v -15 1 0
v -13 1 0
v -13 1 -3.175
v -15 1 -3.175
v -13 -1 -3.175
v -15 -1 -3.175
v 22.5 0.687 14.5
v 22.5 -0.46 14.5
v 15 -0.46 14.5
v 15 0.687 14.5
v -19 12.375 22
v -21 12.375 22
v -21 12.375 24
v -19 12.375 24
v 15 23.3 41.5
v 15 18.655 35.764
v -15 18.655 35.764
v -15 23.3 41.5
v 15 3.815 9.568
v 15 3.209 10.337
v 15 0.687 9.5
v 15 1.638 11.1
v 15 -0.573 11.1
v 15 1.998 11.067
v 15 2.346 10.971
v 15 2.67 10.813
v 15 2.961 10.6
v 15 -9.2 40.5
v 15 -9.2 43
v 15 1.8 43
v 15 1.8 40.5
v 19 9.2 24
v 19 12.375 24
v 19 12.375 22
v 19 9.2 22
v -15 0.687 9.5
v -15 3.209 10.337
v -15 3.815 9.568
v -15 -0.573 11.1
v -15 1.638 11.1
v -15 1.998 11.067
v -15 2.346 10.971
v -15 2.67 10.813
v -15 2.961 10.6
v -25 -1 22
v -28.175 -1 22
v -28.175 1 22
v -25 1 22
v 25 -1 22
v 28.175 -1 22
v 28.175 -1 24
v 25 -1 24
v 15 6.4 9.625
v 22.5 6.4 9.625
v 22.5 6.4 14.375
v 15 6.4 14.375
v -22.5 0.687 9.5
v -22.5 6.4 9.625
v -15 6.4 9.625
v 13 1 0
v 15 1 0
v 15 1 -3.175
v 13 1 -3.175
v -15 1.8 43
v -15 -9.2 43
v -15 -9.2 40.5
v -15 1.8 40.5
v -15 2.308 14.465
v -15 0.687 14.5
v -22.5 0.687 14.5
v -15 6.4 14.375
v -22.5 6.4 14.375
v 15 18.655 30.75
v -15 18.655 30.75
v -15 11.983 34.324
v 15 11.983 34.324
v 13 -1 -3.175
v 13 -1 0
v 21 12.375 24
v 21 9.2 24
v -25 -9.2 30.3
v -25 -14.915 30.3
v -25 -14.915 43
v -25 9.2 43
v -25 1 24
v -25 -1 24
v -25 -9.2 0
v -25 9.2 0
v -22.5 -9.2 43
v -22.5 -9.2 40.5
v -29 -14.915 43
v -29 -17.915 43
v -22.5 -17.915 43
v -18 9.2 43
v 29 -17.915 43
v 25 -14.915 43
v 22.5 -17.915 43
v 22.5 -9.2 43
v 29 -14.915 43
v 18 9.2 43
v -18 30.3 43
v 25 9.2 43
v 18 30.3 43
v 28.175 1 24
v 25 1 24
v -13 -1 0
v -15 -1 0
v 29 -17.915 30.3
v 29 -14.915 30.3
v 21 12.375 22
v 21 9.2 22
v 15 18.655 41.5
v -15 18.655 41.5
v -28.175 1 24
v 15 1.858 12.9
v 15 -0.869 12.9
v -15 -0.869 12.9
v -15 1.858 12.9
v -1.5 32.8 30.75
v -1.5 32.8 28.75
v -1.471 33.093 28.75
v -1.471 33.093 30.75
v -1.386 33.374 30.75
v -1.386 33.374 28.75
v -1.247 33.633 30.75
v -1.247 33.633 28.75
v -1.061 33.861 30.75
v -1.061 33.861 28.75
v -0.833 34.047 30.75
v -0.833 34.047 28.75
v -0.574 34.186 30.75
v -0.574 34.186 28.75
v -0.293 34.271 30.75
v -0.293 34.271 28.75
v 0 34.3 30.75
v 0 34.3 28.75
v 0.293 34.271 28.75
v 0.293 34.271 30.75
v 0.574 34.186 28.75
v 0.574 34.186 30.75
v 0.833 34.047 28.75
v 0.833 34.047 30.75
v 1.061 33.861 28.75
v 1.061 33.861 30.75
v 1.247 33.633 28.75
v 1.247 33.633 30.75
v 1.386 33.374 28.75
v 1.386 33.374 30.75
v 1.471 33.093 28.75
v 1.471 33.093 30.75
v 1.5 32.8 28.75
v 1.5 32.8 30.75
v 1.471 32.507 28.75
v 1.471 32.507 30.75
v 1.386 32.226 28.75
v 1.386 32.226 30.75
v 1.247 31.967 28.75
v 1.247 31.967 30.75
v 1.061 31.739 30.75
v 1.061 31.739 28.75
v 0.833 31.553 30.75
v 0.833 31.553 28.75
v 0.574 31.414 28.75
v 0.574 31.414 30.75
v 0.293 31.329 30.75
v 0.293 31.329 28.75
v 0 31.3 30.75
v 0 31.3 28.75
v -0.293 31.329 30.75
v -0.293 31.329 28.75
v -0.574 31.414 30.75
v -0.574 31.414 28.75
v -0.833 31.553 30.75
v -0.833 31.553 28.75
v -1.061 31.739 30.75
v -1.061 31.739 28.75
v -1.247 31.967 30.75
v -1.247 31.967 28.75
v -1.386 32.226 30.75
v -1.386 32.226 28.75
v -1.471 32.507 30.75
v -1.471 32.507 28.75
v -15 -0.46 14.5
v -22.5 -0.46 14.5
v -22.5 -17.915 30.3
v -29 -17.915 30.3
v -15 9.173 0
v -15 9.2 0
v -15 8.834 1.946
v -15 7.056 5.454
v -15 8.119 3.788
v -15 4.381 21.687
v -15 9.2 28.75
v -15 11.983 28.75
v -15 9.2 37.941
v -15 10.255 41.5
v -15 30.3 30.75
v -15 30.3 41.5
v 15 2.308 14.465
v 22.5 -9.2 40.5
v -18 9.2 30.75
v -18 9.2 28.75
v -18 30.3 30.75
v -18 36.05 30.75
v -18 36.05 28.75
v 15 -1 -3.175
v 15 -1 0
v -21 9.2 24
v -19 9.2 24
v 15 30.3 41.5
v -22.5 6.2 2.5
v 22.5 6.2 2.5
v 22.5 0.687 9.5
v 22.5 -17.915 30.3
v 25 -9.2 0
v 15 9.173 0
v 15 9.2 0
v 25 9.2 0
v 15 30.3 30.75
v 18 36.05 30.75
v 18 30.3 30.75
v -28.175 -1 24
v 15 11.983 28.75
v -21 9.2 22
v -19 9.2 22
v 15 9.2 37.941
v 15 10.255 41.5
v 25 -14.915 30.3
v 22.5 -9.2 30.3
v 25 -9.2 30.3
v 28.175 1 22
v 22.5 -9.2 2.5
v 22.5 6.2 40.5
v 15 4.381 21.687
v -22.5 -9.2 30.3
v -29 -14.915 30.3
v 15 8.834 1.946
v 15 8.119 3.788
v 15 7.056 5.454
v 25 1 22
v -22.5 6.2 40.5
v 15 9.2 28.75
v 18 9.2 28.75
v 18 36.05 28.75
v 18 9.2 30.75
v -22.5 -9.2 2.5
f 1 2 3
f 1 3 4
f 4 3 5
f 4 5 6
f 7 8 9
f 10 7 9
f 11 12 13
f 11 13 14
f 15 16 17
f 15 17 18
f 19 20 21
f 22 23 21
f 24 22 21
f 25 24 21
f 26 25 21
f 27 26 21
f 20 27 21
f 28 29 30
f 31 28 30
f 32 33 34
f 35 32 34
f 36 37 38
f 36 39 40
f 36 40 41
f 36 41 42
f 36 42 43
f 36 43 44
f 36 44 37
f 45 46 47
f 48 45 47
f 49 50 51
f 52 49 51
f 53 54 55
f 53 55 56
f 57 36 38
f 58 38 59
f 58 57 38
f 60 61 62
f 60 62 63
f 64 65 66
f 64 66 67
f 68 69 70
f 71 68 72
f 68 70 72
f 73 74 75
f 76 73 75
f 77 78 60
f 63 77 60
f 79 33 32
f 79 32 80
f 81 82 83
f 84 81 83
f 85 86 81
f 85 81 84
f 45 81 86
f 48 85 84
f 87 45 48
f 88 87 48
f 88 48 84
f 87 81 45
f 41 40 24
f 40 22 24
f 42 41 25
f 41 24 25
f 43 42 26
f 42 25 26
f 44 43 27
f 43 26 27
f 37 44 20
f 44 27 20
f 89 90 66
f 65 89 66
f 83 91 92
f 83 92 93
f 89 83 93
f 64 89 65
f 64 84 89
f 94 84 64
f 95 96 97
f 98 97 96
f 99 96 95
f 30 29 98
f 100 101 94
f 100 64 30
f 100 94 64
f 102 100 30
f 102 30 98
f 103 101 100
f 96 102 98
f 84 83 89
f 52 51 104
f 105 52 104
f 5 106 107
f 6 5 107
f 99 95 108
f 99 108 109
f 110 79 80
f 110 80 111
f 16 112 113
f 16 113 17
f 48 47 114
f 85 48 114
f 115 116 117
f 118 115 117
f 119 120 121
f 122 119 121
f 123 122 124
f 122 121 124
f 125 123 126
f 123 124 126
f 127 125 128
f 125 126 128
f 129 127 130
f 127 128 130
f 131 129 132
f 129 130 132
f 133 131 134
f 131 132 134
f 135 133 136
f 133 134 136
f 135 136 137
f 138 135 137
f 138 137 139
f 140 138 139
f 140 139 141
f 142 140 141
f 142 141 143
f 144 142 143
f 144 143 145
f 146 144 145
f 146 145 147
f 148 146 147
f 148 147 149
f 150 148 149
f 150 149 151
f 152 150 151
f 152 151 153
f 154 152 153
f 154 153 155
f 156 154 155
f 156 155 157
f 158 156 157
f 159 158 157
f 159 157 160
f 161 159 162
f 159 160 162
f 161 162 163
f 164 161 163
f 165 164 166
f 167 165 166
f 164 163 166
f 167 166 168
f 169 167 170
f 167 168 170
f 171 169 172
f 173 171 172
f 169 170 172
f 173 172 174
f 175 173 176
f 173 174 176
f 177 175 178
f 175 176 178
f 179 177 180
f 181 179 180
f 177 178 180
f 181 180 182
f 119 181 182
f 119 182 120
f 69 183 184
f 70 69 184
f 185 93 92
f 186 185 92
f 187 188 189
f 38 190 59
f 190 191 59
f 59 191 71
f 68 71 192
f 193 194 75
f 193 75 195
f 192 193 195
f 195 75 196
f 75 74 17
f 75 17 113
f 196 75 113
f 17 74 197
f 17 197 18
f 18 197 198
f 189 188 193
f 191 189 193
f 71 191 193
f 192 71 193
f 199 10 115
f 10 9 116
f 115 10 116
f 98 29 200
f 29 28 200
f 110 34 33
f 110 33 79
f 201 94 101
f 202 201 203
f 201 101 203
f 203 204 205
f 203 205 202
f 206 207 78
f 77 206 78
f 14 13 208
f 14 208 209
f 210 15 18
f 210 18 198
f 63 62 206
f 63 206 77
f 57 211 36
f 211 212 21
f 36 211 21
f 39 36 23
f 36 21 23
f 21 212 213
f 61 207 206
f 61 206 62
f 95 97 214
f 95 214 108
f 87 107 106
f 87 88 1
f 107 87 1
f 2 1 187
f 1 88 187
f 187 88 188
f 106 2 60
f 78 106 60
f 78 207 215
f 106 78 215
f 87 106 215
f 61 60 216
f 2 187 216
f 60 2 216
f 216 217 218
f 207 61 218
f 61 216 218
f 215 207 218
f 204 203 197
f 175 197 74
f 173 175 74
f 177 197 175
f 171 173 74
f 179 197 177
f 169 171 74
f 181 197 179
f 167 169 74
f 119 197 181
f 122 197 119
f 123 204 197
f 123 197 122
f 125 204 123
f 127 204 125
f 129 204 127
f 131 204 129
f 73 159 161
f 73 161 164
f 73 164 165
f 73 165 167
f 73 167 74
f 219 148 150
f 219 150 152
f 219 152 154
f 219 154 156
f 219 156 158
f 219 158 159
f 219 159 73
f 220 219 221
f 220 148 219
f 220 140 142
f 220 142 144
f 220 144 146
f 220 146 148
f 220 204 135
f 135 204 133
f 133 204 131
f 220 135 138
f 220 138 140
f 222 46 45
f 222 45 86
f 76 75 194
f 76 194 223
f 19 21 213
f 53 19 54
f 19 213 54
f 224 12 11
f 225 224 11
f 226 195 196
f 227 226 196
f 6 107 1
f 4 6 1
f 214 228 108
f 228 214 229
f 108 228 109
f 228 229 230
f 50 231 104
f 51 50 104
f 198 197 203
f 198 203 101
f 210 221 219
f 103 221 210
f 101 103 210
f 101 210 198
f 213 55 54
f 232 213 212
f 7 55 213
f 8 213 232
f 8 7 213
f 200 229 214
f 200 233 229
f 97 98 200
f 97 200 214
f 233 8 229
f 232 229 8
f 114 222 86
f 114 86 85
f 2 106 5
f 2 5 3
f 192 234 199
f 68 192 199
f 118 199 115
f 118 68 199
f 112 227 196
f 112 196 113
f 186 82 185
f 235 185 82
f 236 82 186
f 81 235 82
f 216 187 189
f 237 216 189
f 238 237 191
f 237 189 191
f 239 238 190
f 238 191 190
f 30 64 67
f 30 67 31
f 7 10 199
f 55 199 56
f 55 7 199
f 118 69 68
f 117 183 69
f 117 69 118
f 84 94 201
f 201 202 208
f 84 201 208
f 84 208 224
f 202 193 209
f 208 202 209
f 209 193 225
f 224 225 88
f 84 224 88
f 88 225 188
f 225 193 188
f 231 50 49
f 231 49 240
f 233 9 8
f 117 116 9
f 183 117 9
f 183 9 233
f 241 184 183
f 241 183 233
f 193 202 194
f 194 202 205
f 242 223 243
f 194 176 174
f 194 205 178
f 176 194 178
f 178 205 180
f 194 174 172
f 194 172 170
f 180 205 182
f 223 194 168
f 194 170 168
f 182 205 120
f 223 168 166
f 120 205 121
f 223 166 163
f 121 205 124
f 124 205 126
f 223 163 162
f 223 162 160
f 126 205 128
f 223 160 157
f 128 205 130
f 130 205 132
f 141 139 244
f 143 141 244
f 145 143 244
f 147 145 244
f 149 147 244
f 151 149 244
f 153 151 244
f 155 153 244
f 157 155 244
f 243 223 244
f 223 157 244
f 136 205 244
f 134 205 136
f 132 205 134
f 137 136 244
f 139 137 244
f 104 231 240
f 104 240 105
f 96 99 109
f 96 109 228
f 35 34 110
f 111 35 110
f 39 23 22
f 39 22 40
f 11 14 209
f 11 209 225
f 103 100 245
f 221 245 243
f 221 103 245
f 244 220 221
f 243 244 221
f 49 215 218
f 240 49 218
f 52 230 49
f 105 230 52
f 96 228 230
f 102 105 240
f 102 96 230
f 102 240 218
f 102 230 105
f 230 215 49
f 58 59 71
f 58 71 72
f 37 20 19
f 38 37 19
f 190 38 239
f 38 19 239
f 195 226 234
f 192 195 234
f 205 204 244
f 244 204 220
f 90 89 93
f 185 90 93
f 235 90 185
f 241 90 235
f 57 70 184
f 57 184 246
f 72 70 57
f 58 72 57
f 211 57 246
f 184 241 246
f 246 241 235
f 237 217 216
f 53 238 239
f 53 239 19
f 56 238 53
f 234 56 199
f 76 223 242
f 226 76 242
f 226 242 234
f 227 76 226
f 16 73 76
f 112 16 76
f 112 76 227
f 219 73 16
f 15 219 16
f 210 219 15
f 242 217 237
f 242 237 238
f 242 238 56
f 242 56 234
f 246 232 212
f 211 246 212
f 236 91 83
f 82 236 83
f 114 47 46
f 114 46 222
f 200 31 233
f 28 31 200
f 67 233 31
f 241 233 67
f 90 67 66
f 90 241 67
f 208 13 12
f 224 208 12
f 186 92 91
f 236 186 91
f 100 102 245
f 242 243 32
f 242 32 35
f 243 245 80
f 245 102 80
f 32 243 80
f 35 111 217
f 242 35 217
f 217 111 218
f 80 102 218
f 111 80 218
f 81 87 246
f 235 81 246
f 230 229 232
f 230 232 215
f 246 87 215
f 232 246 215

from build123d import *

# Parameters (mm, degrees)
SKETCH1_W               = 50
SKETCH1_H               = 18.4
BOSS_EXTRUDE1_DEPTH     = 43
SKETCH2_W               = 7.5
SKETCH2_H               = 5
SKETCH2_W_2             = 30
SKETCH2_H_2             = 1.8
CUT_EXTRUDE1_DEPTH      = 15.6
CUT_EXTRUDE2_START      = -22.5
CUT_EXTRUDE2_DEPTH      = 22.5
CUT_EXTRUDE3_START      = -15
CUT_EXTRUDE3_DEPTH      = 15
BOSS_EXTRUDE3_DEPTH     = 7.5
BOSS_EXTRUDE4_START     = 45
BOSS_EXTRUDE4_DEPTH     = 7.5
BOSS_EXTRUDE7_DEPTH     = 30
MTRL_RMV_DEPTH          = 60.694974663
SKETCH22_W              = 36
SKETCH22_H              = 24.066709319
SKETCH22_W_2            = 3
SKETCH22_H_2            = 2.783290681
BOSS_EXTRUDE8_DEPTH     = 2
BOSS_EXTRUDE9_DEPTH     = 36
SKETCH27_W              = 3
SKETCH27_H              = 21.1
BOSS_EXTRUDE10_DEPTH    = 14.25
SKETCH28_R              = 1.5
CUT_EXTRUDE4_DEPTH      = 53.451549072
SKETCH4_W               = 30
SKETCH4_H               = 11
WIRE_HOLE_DEPTH         = 2.5
SKETCH13_W              = 2
SKETCH13_H              = 2
FRONT_SHIELD_PEGS_DEPTH = 3.175
SKETCH14_W              = 2
SKETCH14_H              = 2
TOP_SHIELD_PEGS_DEPTH   = 3.175
FILLET9_R               = 10
FILLET10_R              = 2
LEGS_START              = 24
LEGS_DEPTH              = 12.7
SKETCH29_W              = 2
SKETCH29_H              = 2
SIDE_SHIELD_PEGS1_DEPTH = 3.175
SIDE_START              = -50
SKETCH29_2_W            = 2
SKETCH29_2_H            = 2
SIDE_SHIELD_PEGS2_DEPTH = 3.175


with BuildPart() as part:
    # Sketch1 → Boss-Extrude1 (new body)
    with BuildSketch(Plane.XY):
        Rectangle(SKETCH1_W, SKETCH1_H)
    extrude(amount=BOSS_EXTRUDE1_DEPTH)

    # Sketch2 → Cut-Extrude1 (cut)
    with BuildSketch(Plane(origin=(0, -9.2, 0), x_dir=(-1, 0, 0), z_dir=(0, -1, 0))):
        with Locations((-18.75, -12)):
            Rectangle(SKETCH2_W, SKETCH2_H)
        with Locations((18.75, -12)):
            Rectangle(SKETCH2_W, SKETCH2_H)
        with Locations((0, -12)):
            Rectangle(SKETCH2_W_2, SKETCH2_H_2)
    extrude(amount=-CUT_EXTRUDE1_DEPTH, mode=Mode.SUBTRACT)

    # Sketch3 → Cut-Extrude2 (cut)
    with BuildSketch(Plane(origin=(0, 0, 0), x_dir=(0, 0, -1), z_dir=(1, 0, 0)).offset(CUT_EXTRUDE2_START)):
        Polygon((-40.5, 6.2), (-40.5, -9.2), (-2.5, -9.2), (-2.5, 6.2), (-11.825335932, -1.144738516), align=None)
    cut_extrude2 = extrude(amount=CUT_EXTRUDE2_DEPTH, mode=Mode.SUBTRACT)

    # Mirror3: Cut-Extrude2 across plane
    add(cut_extrude2.mirror(Plane(origin=(0, 0, 0), x_dir=(0, 0, 1), z_dir=(1, 0, 0))), mode=Mode.SUBTRACT)

    # Sketch3<3> → Cut-Extrude3 (cut)
    with BuildSketch(Plane(origin=(0, 0, 0), x_dir=(0, 0, -1), z_dir=(1, 0, 0)).offset(CUT_EXTRUDE3_START)):
        Polygon((-12, 1.9), (-2.731466864, 9.2), (-40.5, 9.2), (-21.687267414, 4.381300074), (-12, 1.6), align=None)
    cut_extrude3 = extrude(amount=CUT_EXTRUDE3_DEPTH, mode=Mode.SUBTRACT)

    # Mirror4: Cut-Extrude3 across plane
    add(cut_extrude3.mirror(Plane(origin=(0, 0, 0), x_dir=(0, 0, 1), z_dir=(1, 0, 0))), mode=Mode.SUBTRACT)

    # Sketch12 → Boss-Extrude3 (add)
    with BuildSketch(Plane.ZY.offset(-22.5)):
        Polygon((9.5, 6.4), (9.5, 0.686721981), (9.625, 6.4), align=None)
        Polygon((14.5, 6.4), (14.5, 0.686721981), (14.375, 6.4), align=None)
    extrude(amount=BOSS_EXTRUDE3_DEPTH)

    # Sketch12<2> → Boss-Extrude4 (add)
    with BuildSketch(Plane.ZY.offset(-22.5).offset(BOSS_EXTRUDE4_START)):
        Polygon((9.5, 6.4), (9.5, 0.686721981), (9.625, 6.4), align=None)
        Polygon((14.5, 6.4), (14.5, 0.686721981), (14.375, 6.4), align=None)
    extrude(amount=-BOSS_EXTRUDE4_DEPTH)

    # Sketch17 → Boss-Extrude7 (add)
    with BuildSketch(Plane(origin=(-15, 0, 0), x_dir=(0, 0, -1), z_dir=(1, 0, 0))):
        Polygon((-43, 9.2), (-43, 10.7), (-21.687267414, 4.381300074), (-40.5, 9.2), align=None)
    extrude(amount=BOSS_EXTRUDE7_DEPTH)

    # Sketch18 → Mtrl Rmv (cut, through all)
    with BuildSketch(Plane(origin=(15, 0, 0), x_dir=(0, 0, -1), z_dir=(1, 0, 0))):
        Polygon((-43, 10.7), (-43, 9.2), (-37.940557511, 9.2), align=None)
    extrude(amount=-MTRL_RMV_DEPTH, mode=Mode.SUBTRACT)

    # Sketch22 → Boss-Extrude8 (add)
    with BuildSketch(Plane.XY.offset(30.75)):
        with Locations((0, 24.016645341)):
            Rectangle(SKETCH22_W, SKETCH22_H)
        with Locations((16.5, 10.591645341)):
            Rectangle(SKETCH22_W_2, SKETCH22_H_2)
        with Locations((-16.5, 10.591645341)):
            Rectangle(SKETCH22_W_2, SKETCH22_H_2)
    extrude(amount=-BOSS_EXTRUDE8_DEPTH)

    # Sketch25 → Boss-Extrude9 (add)
    with BuildSketch(Plane(origin=(18, 0, 0), x_dir=(0, 0, -1), z_dir=(1, 0, 0))):
        Polygon((-43, 30.3), (-43, 9.2), (-37.940557511, 9.2), (-41.5, 10.25528697), (-41.5, 18.655212051), (-35.764164569, 18.655212051), (-41.5, 23.3), (-41.5, 30.3), align=None)
        Polygon((-30.75, 11.983290681), (-30.75, 18.655212051), (-34.323998772, 11.983290681), align=None)
    extrude(amount=-BOSS_EXTRUDE9_DEPTH)

    # Sketch27 → Boss-Extrude10 (add)
    with BuildSketch(Plane.XY.offset(43)):
        with Locations((-16.5, 19.75)):
            Rectangle(SKETCH27_W, SKETCH27_H)
        with Locations((16.5, 19.75)):
            Rectangle(SKETCH27_W, SKETCH27_H)
    extrude(amount=-BOSS_EXTRUDE10_DEPTH)

    # Sketch28 → Cut-Extrude4 (cut, through all)
    with BuildSketch(Plane(origin=(0, 0, 28.75), x_dir=(-1, 0, 0), z_dir=(0, 0, -1))):
        with Locations((0, 32.8)):
            Circle(SKETCH28_R)
    extrude(amount=-CUT_EXTRUDE4_DEPTH, mode=Mode.SUBTRACT)

    # Sketch4 → Wire Hole (cut)
    with BuildSketch(Plane.XY.offset(43)):
        with Locations((0, -3.7)):
            Rectangle(SKETCH4_W, SKETCH4_H)
    extrude(amount=-WIRE_HOLE_DEPTH, mode=Mode.SUBTRACT)

    # Sketch13 → Front Shield Pegs (add)
    with BuildSketch(Plane(origin=(0, 0, 0), x_dir=(-1, 0, 0), z_dir=(0, 0, -1))):
        with Locations((-14, 0)):
            Rectangle(SKETCH13_W, SKETCH13_H)
        with Locations((14, 0)):
            Rectangle(SKETCH13_W, SKETCH13_H)
    extrude(amount=FRONT_SHIELD_PEGS_DEPTH)

    # Sketch14 → Top Shield Pegs (add)
    with BuildSketch(Plane(origin=(0, 9.2, 0), x_dir=(1, 0, 0), z_dir=(0, 1, 0))):
        with Locations((20, -23)):
            Rectangle(SKETCH14_W, SKETCH14_H)
        with Locations((-20, -23)):
            Rectangle(SKETCH14_W, SKETCH14_H)
    extrude(amount=TOP_SHIELD_PEGS_DEPTH)

    # Fillet9
    # the kernel refuses this fillet: 10 mm, written as the material it takes off along each edge
    with BuildSketch(Plane(origin=(-15, 9.2, 2.731466864), x_dir=(0, 0, -1), z_dir=(1, 0, 0))) as fillet9_piece_1:
        with BuildLine():
            CenterArc((FILLET9_R * 0.346519160452, -FILLET9_R), FILLET9_R, 90, 38.224362431)
            Line((-FILLET9_R * 0.27222332899, -FILLET9_R * 0.214406127977), (0, 0))
            Line((0, 0), (FILLET9_R * 0.346519160452, 0))
        make_face()
    extrude(amount=30, mode=Mode.SUBTRACT)

    # Fillet10
    fillet10_edges = [part.edges().sort_by_distance(p)[0] for p in [
        (0, 2.608850031, 11.1),
    ]]
    fillet(fillet10_edges, radius=FILLET10_R)

    # Sketch19 → Legs (add)
    with BuildSketch(Plane.XY.offset(19).offset(LEGS_START)):
        Polygon((22.5, -9.2), (22.5, -17.915), (29, -17.915), (29, -14.915), (25, -14.915), (25, -9.2), align=None)
        Polygon((-22.5, -9.2), (-22.5, -17.915), (-29, -17.915), (-29, -14.915), (-25, -14.915), (-25, -9.2), align=None)
    extrude(amount=-LEGS_DEPTH)

    # Sketch29 → Side Shield Pegs1 (add)
    with BuildSketch(Plane.ZY.offset(25)):
        with Locations((23, 0)):
            Rectangle(SKETCH29_W, SKETCH29_H)
    extrude(amount=SIDE_SHIELD_PEGS1_DEPTH)

    # Sketch29<2> → Side Shield Pegs2 (add)
    with BuildSketch(Plane.ZY.offset(25).offset(SIDE_START)):
        with Locations((23, 0)):
            Rectangle(SKETCH29_2_W, SKETCH29_2_H)
    extrude(amount=-SIDE_SHIELD_PEGS2_DEPTH)


solid = part.part
